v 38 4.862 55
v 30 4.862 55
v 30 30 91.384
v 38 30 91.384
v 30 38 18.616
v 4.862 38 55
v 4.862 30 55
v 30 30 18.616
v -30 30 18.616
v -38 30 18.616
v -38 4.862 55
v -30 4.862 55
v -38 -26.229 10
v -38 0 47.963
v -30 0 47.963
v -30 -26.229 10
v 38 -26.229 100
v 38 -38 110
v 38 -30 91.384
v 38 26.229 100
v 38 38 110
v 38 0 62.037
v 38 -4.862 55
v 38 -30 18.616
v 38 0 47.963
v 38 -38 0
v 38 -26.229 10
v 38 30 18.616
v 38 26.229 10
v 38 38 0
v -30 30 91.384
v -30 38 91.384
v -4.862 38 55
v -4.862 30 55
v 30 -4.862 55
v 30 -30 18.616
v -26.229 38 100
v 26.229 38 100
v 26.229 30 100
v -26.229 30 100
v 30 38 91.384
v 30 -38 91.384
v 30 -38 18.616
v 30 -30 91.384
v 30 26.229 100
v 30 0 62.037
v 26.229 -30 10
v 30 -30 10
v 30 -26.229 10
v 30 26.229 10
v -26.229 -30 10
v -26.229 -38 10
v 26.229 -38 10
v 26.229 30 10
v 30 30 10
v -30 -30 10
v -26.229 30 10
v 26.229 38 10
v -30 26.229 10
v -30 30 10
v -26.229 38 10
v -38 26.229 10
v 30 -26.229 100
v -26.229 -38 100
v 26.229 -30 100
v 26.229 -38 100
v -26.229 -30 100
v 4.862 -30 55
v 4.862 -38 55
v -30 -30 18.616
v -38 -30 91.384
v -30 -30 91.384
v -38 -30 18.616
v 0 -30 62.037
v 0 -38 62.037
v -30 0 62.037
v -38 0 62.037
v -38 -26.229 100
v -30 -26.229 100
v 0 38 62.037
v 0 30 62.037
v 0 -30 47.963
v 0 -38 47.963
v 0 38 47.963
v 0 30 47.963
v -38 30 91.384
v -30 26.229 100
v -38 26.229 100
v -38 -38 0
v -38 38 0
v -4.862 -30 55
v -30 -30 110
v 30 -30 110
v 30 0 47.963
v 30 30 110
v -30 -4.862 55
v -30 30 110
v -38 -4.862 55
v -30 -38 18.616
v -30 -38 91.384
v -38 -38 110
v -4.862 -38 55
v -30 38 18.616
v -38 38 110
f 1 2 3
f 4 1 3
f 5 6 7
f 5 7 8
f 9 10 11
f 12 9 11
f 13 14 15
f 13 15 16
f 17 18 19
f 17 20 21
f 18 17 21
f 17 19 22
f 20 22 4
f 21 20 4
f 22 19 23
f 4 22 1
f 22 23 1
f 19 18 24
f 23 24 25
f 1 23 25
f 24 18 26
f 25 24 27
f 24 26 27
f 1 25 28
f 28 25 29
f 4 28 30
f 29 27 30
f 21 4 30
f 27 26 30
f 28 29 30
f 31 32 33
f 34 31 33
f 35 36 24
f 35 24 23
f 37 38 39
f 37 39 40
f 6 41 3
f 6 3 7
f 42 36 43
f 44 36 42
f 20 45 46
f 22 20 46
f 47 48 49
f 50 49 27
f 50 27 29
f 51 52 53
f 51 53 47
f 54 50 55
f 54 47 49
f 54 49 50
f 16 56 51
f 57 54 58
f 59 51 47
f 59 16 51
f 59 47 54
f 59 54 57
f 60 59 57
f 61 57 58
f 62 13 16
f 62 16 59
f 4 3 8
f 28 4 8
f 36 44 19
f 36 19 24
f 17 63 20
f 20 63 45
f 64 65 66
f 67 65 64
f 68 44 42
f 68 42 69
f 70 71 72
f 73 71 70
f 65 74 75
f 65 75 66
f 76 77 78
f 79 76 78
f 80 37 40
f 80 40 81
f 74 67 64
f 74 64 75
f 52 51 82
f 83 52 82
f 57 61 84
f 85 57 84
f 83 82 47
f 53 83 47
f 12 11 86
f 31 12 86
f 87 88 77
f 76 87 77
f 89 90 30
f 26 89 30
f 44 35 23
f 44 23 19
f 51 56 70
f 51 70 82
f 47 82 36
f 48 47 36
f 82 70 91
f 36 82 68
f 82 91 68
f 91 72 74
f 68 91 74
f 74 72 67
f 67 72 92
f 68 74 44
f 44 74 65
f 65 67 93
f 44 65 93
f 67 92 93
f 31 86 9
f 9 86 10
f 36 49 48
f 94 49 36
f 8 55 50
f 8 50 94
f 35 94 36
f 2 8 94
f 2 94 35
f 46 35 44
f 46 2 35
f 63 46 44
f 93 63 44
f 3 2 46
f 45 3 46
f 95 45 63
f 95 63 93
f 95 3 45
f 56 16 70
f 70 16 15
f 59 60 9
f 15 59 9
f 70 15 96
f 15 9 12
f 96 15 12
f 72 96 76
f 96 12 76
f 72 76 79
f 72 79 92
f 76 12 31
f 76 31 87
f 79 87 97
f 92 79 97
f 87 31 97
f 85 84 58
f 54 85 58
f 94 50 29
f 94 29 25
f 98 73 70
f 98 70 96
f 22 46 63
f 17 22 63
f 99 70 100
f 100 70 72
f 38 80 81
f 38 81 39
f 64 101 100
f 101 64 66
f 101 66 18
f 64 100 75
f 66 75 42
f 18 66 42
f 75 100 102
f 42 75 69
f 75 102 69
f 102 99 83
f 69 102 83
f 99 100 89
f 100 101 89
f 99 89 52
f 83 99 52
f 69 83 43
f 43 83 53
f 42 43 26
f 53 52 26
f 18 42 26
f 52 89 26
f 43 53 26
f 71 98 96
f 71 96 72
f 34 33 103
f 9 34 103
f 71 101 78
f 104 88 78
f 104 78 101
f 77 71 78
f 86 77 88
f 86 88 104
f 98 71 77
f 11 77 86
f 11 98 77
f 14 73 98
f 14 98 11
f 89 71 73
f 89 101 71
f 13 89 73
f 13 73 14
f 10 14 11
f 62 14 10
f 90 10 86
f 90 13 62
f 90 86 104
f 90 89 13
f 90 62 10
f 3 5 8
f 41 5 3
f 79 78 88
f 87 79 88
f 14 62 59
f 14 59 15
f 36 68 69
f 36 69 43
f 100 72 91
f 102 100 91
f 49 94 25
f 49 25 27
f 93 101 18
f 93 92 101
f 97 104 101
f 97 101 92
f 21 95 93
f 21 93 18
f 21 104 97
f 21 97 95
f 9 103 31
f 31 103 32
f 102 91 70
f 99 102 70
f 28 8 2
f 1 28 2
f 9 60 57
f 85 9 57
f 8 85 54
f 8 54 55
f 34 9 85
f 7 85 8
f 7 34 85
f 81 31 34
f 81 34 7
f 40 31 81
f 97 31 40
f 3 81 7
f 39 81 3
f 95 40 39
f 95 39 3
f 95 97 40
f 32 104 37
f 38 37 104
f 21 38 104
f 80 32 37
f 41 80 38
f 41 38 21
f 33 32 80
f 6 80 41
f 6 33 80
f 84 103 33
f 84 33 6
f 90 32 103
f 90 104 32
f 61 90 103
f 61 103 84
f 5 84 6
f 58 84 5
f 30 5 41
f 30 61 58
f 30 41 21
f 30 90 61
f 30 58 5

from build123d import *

# Parameters (mm, degrees)
SKETCH1_W           = 76
SKETCH1_H           = 76
BOSS_EXTRUDE1_DEPTH = 110
SKETCH2_W           = 60
SKETCH2_H           = 60
CUT_EXTRUDE1_DEPTH  = 100
CUT_EXTRUDE2_REACH  = 140.996
CUT_EXTRUDE3_REACH  = 140.996


with BuildPart() as part:
    # Sketch1 → Boss-Extrude1 (new body)
    with BuildSketch(Plane.XY):
        Rectangle(SKETCH1_W, SKETCH1_H)
    extrude(amount=BOSS_EXTRUDE1_DEPTH)

    # Sketch2 → Cut-Extrude1 (cut)
    with BuildSketch(Plane.XY.offset(110)):
        Rectangle(SKETCH2_W, SKETCH2_H)
    extrude(amount=-CUT_EXTRUDE1_DEPTH, mode=Mode.SUBTRACT)

    # Cut-Extrude2: up to this face of the body (flat: up to its plane)
    cut_extrude2_end = Plane(part.part.faces().sort_by_distance((0, -38, 55))[0])
    # Sketch4 → Cut-Extrude2 (cut, up to the picked face)
    with BuildSketch(Plane(origin=(0, 38, 0), x_dir=(1, 0, 0), z_dir=(0, 1, 0)), mode=Mode.PRIVATE) as cut_extrude2_sk1:
        Polygon((-26.229048752, -10), (0, -47.963096879), (26.229048752, -10), align=None)
    cut_extrude2_tool1 = split(extrude(cut_extrude2_sk1.sketch, amount=-CUT_EXTRUDE2_REACH, mode=Mode.PRIVATE), bisect_by=cut_extrude2_end, keep=Keep.BOTH, mode=Mode.PRIVATE)
    # Sketch4 → Cut-Extrude2 (cut, up to the picked face)
    with BuildSketch(Plane(origin=(0, 38, 0), x_dir=(1, 0, 0), z_dir=(0, 1, 0)), mode=Mode.PRIVATE) as cut_extrude2_sk2:
        Polygon((0, -62.036903121), (26.229048752, -100), (-26.229048752, -100), align=None)
    cut_extrude2_tool2 = split(extrude(cut_extrude2_sk2.sketch, amount=-CUT_EXTRUDE2_REACH, mode=Mode.PRIVATE), bisect_by=cut_extrude2_end, keep=Keep.BOTH, mode=Mode.PRIVATE)
    # Sketch4 → Cut-Extrude2 (cut, up to the picked face)
    with BuildSketch(Plane(origin=(0, 38, 0), x_dir=(1, 0, 0), z_dir=(0, 1, 0)), mode=Mode.PRIVATE) as cut_extrude2_sk3:
        Polygon((4.861860338, -55), (30, -18.61585049), (30, -91.38414951), align=None)
    cut_extrude2_tool3 = split(extrude(cut_extrude2_sk3.sketch, amount=-CUT_EXTRUDE2_REACH, mode=Mode.PRIVATE), bisect_by=cut_extrude2_end, keep=Keep.BOTH, mode=Mode.PRIVATE)
    # Sketch4 → Cut-Extrude2 (cut, up to the picked face)
    with BuildSketch(Plane(origin=(0, 38, 0), x_dir=(1, 0, 0), z_dir=(0, 1, 0)), mode=Mode.PRIVATE) as cut_extrude2_sk4:
        Polygon((-30, -91.38414951), (-4.861860338, -55), (-30, -18.61585049), align=None)
    cut_extrude2_tool4 = split(extrude(cut_extrude2_sk4.sketch, amount=-CUT_EXTRUDE2_REACH, mode=Mode.PRIVATE), bisect_by=cut_extrude2_end, keep=Keep.BOTH, mode=Mode.PRIVATE)
    add(cut_extrude2_tool1.solids().sort_by(Axis((0, 38, 22.654366), (0, -1, 0)))[0], mode=Mode.SUBTRACT)
    add(cut_extrude2_tool2.solids().sort_by(Axis((0, 38, 87.345634), (0, -1, 0)))[0], mode=Mode.SUBTRACT)
    add(cut_extrude2_tool3.solids().sort_by(Axis((21.62062, 38, 55), (0, -1, 0)))[0], mode=Mode.SUBTRACT)
    add(cut_extrude2_tool4.solids().sort_by(Axis((-21.62062, 38, 55), (0, -1, 0)))[0], mode=Mode.SUBTRACT)

    # Cut-Extrude3: up to this face of the body (flat: up to its plane)
    cut_extrude3_end = Plane(part.part.faces().sort_by_distance((38, 0, 55))[0])
    # Sketch5 → Cut-Extrude3 (cut, up to the picked face)
    with BuildSketch(Plane.ZY.offset(38), mode=Mode.PRIVATE) as cut_extrude3_sk1:
        Polygon((18.61585049, 30), (55, 4.861860338), (91.38414951, 30), align=None)
    cut_extrude3_tool1 = split(extrude(cut_extrude3_sk1.sketch, amount=-CUT_EXTRUDE3_REACH, mode=Mode.PRIVATE), bisect_by=cut_extrude3_end, keep=Keep.BOTH, mode=Mode.PRIVATE)
    # Sketch5 → Cut-Extrude3 (cut, up to the picked face)
    with BuildSketch(Plane.ZY.offset(38), mode=Mode.PRIVATE) as cut_extrude3_sk2:
        Polygon((91.38414951, -30), (18.61585049, -30), (55, -4.861860338), align=None)
    cut_extrude3_tool2 = split(extrude(cut_extrude3_sk2.sketch, amount=-CUT_EXTRUDE3_REACH, mode=Mode.PRIVATE), bisect_by=cut_extrude3_end, keep=Keep.BOTH, mode=Mode.PRIVATE)
    # Sketch5 → Cut-Extrude3 (cut, up to the picked face)
    with BuildSketch(Plane.ZY.offset(38), mode=Mode.PRIVATE) as cut_extrude3_sk3:
        Polygon((10, 26.229048752), (47.963096879, 0), (10, -26.229048752), align=None)
    cut_extrude3_tool3 = split(extrude(cut_extrude3_sk3.sketch, amount=-CUT_EXTRUDE3_REACH, mode=Mode.PRIVATE), bisect_by=cut_extrude3_end, keep=Keep.BOTH, mode=Mode.PRIVATE)
    # Sketch5 → Cut-Extrude3 (cut, up to the picked face)
    with BuildSketch(Plane.ZY.offset(38), mode=Mode.PRIVATE) as cut_extrude3_sk4:
        Polygon((62.036903121, 0), (100, -26.229048752), (100, 26.229048752), align=None)
    cut_extrude3_tool4 = split(extrude(cut_extrude3_sk4.sketch, amount=-CUT_EXTRUDE3_REACH, mode=Mode.PRIVATE), bisect_by=cut_extrude3_end, keep=Keep.BOTH, mode=Mode.PRIVATE)
    add(cut_extrude3_tool1.solids().sort_by(Axis((-38, 21.62062, 55), (1, 0, 0)))[0], mode=Mode.SUBTRACT)
    add(cut_extrude3_tool2.solids().sort_by(Axis((-38, -21.62062, 55), (1, 0, 0)))[0], mode=Mode.SUBTRACT)
    add(cut_extrude3_tool3.solids().sort_by(Axis((-38, 0, 22.654366), (1, 0, 0)))[0], mode=Mode.SUBTRACT)
    add(cut_extrude3_tool4.solids().sort_by(Axis((-38, 0, 87.345634), (1, 0, 0)))[0], mode=Mode.SUBTRACT)


solid = part.part
